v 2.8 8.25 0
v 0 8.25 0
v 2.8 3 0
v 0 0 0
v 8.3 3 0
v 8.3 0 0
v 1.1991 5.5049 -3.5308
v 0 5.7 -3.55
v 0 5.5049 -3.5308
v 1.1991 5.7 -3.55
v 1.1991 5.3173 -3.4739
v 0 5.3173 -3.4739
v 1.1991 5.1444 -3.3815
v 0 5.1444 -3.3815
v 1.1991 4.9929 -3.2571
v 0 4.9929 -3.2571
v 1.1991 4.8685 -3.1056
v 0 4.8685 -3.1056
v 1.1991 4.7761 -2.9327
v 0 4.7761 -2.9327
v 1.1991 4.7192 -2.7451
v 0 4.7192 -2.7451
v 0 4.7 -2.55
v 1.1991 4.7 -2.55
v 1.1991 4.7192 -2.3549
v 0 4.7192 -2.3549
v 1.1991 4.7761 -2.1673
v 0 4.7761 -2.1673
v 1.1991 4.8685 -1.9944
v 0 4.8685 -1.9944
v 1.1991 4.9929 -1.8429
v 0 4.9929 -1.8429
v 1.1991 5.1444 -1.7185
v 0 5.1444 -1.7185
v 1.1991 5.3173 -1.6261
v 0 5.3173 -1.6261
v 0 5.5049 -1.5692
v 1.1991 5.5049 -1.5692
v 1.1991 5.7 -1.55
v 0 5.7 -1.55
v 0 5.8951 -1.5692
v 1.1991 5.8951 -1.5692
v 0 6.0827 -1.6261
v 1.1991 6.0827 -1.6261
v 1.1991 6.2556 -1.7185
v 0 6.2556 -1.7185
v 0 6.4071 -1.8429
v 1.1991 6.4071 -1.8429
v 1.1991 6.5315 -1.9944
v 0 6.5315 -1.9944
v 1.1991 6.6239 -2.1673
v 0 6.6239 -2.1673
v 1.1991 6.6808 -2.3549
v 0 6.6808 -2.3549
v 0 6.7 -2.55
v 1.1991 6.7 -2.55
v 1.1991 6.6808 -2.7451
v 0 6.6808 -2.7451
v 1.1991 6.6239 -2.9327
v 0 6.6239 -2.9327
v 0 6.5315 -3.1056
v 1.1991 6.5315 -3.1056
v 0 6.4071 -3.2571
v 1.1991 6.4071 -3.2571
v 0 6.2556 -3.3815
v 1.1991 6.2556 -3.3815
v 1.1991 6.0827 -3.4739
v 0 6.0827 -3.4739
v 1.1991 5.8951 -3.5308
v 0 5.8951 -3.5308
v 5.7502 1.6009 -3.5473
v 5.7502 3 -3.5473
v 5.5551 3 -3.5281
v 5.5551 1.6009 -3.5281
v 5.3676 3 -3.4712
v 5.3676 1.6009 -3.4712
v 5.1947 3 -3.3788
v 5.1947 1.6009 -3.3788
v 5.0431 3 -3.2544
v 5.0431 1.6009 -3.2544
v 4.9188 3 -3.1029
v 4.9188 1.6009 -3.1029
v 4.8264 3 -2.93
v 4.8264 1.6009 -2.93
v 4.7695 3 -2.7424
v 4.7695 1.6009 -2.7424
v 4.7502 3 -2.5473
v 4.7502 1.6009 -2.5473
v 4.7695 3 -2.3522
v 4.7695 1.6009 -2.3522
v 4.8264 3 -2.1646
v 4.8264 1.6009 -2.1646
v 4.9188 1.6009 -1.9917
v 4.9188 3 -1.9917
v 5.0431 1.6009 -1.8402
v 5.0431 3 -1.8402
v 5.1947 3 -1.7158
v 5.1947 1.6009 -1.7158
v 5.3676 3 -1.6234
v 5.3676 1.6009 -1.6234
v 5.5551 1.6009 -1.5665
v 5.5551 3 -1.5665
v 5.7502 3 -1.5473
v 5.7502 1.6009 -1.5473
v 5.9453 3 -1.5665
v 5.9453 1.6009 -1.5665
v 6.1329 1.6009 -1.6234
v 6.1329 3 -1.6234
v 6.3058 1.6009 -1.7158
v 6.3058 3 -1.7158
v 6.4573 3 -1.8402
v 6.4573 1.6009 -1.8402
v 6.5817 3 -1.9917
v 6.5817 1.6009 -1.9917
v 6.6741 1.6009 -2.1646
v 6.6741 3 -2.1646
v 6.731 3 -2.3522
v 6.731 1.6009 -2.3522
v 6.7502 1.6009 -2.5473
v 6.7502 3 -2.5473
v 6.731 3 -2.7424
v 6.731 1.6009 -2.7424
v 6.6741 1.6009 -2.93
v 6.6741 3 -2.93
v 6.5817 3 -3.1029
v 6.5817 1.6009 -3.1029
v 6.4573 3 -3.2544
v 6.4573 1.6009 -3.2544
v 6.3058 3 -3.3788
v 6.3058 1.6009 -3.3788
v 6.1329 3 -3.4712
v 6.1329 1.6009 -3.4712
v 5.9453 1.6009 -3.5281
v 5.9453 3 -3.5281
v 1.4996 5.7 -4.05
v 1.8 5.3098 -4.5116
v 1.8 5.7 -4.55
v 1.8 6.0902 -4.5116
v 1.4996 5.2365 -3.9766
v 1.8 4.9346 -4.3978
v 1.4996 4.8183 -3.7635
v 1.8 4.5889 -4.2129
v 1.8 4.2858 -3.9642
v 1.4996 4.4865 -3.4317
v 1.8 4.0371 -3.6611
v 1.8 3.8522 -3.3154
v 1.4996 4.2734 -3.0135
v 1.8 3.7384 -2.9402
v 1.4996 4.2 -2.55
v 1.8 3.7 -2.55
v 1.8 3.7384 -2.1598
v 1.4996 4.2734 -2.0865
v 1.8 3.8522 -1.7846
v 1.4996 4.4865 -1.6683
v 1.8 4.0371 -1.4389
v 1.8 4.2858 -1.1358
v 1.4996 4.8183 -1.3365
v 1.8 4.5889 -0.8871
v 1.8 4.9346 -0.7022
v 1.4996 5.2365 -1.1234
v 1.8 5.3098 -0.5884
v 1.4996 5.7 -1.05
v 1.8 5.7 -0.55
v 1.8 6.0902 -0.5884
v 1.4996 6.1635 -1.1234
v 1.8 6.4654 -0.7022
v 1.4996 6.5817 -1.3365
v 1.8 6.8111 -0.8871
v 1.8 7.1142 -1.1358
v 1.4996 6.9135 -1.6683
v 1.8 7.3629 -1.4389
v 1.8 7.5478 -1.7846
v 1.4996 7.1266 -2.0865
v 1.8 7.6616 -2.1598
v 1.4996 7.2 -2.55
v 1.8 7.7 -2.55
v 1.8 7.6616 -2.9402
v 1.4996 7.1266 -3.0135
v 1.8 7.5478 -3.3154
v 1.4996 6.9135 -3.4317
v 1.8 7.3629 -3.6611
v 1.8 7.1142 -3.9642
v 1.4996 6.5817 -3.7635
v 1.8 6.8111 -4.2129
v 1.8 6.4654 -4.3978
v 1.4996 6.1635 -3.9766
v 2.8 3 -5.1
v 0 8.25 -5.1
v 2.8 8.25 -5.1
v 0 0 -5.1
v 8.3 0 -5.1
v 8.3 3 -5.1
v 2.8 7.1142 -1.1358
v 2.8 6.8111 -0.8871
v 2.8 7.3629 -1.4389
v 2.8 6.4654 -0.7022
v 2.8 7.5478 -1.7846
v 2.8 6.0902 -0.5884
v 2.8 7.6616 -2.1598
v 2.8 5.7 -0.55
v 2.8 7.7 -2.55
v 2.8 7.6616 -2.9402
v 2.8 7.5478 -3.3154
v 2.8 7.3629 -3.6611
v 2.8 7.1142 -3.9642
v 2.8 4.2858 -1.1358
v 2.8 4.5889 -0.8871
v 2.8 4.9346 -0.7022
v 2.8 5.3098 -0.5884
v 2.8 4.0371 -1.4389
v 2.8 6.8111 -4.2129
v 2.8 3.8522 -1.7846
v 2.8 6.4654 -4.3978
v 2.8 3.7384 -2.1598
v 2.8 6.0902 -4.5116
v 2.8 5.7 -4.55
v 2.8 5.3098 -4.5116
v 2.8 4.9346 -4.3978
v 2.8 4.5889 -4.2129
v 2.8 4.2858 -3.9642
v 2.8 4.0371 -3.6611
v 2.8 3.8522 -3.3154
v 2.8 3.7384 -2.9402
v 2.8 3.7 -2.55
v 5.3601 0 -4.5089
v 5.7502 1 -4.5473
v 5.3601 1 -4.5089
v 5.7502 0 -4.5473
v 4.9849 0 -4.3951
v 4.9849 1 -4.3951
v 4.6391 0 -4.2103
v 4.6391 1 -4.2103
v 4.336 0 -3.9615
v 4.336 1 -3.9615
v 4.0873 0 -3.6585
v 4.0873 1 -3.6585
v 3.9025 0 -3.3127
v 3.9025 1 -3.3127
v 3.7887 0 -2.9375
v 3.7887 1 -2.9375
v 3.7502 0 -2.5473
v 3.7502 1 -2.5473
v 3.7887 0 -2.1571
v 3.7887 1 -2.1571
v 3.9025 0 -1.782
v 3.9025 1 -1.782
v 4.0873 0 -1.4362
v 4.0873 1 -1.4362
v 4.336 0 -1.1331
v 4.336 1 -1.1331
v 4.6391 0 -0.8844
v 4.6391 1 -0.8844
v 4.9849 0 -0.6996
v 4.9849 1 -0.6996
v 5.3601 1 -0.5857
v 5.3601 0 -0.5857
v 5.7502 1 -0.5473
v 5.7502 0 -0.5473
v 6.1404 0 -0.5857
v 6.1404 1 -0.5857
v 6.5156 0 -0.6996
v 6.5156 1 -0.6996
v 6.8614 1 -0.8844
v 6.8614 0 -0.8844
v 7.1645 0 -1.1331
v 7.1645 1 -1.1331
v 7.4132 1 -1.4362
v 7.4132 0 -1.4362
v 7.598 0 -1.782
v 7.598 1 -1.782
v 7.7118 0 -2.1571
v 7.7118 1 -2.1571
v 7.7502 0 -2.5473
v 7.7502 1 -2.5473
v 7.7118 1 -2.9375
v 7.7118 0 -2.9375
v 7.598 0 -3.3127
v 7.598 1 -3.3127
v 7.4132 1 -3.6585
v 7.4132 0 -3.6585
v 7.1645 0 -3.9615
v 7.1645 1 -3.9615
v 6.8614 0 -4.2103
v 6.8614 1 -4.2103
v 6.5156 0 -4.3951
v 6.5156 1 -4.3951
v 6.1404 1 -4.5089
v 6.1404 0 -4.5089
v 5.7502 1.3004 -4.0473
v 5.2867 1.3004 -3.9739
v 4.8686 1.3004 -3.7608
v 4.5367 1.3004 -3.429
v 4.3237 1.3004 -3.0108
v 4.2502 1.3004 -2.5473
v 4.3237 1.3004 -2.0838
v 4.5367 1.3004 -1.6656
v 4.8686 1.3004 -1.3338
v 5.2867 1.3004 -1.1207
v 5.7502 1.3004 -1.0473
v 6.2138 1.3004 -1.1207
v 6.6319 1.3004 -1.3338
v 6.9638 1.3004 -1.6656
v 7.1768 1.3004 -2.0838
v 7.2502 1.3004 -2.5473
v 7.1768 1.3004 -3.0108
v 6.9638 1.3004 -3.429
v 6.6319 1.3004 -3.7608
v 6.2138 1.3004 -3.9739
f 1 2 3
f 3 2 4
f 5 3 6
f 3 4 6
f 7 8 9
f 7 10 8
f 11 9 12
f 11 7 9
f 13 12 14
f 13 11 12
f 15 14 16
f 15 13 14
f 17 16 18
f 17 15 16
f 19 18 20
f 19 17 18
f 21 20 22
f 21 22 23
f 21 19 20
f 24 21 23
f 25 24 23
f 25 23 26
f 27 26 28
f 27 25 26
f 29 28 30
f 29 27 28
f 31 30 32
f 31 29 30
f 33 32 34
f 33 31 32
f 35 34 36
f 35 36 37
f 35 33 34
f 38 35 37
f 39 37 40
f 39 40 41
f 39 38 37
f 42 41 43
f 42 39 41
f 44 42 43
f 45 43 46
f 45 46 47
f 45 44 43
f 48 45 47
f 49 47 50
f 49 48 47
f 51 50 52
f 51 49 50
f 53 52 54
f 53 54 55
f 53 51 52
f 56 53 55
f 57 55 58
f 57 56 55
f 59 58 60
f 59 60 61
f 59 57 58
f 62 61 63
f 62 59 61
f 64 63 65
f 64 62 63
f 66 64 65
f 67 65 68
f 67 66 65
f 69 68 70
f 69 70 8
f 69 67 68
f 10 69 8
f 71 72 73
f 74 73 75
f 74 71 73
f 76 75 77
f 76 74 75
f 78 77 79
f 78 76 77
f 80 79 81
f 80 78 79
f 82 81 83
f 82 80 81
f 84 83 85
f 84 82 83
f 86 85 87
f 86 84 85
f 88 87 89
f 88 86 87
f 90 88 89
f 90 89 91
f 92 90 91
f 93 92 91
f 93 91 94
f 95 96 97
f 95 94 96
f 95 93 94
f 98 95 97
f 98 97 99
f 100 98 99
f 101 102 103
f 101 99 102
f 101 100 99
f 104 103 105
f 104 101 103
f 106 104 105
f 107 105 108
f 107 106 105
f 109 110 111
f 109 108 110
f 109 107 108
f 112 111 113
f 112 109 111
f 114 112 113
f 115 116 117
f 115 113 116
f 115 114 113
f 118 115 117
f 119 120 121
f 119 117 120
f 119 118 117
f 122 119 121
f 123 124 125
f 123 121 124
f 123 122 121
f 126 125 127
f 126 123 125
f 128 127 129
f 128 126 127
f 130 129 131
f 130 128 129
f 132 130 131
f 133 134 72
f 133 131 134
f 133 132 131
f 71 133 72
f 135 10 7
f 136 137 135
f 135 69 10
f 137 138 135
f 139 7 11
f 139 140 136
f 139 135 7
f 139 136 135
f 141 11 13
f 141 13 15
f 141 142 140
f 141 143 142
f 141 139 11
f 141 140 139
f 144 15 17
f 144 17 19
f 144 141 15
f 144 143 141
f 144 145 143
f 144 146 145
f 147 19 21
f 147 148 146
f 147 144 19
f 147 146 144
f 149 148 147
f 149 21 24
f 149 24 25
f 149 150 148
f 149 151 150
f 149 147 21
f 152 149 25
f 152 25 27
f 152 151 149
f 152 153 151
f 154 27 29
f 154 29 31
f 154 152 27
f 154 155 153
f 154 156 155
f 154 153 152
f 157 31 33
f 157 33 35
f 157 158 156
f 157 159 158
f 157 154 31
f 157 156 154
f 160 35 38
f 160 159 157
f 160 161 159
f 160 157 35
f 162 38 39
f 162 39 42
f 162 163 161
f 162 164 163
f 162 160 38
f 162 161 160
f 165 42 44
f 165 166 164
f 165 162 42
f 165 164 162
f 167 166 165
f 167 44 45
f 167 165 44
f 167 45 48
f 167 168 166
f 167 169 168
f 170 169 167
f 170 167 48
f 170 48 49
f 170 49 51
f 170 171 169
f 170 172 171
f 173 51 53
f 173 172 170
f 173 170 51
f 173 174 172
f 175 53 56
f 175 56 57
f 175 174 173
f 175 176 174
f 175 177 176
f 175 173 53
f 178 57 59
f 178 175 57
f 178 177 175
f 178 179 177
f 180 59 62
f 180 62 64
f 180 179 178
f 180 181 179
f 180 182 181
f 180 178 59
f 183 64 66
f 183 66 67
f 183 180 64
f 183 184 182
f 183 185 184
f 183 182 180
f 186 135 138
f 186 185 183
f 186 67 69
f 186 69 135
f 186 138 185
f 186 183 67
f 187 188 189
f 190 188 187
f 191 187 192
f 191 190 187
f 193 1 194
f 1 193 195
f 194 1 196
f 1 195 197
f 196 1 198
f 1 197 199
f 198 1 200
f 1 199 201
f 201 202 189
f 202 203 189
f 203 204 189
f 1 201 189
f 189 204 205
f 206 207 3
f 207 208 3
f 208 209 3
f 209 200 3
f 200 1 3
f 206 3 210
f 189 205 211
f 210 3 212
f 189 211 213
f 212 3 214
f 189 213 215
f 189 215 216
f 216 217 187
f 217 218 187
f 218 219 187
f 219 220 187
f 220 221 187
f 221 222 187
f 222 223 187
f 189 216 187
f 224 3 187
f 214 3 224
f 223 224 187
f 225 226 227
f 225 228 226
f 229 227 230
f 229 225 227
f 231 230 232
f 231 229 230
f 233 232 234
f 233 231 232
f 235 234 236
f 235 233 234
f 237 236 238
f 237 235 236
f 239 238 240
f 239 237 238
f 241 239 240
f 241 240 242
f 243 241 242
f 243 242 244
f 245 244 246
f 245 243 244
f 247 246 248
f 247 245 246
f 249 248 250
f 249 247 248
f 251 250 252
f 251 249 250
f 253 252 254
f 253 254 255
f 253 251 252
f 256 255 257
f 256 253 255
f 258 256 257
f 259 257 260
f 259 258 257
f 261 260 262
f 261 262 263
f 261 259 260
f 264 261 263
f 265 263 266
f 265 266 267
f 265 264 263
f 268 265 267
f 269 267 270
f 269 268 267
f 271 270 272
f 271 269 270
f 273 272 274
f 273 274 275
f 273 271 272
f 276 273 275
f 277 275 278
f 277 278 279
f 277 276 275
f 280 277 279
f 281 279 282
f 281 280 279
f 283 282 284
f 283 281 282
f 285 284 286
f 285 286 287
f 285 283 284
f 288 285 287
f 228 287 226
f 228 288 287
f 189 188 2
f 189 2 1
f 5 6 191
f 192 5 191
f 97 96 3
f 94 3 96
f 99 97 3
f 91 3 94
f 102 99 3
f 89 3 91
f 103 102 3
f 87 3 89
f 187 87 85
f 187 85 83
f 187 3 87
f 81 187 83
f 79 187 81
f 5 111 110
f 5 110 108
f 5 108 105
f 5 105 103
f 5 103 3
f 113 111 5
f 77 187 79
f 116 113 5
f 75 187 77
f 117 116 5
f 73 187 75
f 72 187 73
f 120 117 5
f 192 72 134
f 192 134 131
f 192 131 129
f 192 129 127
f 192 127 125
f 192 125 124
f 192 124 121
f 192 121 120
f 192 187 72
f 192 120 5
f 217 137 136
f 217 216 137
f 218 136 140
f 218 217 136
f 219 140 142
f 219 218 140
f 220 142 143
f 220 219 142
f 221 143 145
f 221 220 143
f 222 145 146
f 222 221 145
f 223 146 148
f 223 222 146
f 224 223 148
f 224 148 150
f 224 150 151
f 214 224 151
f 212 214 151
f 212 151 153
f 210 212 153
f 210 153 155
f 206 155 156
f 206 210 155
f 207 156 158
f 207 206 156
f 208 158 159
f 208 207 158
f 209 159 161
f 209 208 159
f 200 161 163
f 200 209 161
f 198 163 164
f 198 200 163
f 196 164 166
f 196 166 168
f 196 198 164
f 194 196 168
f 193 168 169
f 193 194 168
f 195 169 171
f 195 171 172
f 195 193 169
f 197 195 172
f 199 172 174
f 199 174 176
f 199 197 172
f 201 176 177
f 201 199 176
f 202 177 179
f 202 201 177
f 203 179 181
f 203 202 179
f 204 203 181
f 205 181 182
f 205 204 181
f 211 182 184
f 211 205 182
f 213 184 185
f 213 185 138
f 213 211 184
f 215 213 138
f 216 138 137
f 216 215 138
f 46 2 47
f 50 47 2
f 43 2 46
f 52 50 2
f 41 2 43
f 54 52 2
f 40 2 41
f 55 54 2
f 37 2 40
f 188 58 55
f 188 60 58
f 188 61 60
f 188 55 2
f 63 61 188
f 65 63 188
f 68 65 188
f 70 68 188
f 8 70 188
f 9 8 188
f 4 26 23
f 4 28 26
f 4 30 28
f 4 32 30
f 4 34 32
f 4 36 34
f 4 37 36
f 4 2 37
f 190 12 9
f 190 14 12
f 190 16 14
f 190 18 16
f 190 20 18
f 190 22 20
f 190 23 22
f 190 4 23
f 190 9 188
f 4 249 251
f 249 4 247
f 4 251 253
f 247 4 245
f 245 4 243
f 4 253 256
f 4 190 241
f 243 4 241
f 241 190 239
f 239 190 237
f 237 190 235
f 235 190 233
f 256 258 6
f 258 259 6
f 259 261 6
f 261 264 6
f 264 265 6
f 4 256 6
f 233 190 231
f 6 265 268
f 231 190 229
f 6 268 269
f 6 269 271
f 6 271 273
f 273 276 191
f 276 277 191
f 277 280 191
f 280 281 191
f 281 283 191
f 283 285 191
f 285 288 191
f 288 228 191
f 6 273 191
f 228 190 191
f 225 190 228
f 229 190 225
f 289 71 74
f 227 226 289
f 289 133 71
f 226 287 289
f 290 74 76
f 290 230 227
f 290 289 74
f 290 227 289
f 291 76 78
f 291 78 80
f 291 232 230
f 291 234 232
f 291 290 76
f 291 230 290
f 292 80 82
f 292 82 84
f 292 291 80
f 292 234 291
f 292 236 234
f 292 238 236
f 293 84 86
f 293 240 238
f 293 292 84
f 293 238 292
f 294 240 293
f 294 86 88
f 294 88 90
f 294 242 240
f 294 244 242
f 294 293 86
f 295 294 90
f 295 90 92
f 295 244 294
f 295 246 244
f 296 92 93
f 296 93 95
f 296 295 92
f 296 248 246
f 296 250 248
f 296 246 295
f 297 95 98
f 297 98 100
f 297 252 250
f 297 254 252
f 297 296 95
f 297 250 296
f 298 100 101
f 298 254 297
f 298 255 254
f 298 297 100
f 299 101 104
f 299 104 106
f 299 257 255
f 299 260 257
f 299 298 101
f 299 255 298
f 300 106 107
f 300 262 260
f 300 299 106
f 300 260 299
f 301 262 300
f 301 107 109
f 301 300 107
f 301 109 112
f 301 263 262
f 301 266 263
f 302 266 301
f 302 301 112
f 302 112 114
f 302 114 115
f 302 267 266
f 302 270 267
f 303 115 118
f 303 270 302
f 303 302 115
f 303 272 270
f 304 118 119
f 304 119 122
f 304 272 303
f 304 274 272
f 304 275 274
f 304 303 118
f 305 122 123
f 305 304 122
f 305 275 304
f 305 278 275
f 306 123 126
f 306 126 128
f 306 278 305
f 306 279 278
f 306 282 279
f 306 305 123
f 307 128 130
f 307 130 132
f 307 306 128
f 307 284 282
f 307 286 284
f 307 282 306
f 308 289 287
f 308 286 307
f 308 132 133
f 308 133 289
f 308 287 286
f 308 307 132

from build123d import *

# Parameters (mm, degrees)
ESQUISSE1_W        = 8.3
ESQUISSE1_H        = 5.1
BOSS_EXTRU_1_DEPTH = 3
ESQUISSE2_W        = 2.8
ESQUISSE2_H        = 5.1
BOSS_EXTRU_2_DEPTH = 5.25


with BuildPart() as part:
    # Esquisse1 → Boss.-Extru.1 (new body)
    with BuildSketch(Plane(origin=(0, 0, 0), x_dir=(1, 0, 0), z_dir=(0, 1, 0))):
        with Locations((4.15, 2.55)):
            Rectangle(ESQUISSE1_W, ESQUISSE1_H)
    extrude(amount=BOSS_EXTRU_1_DEPTH)

    # Esquisse2 → Boss.-Extru.2 (add)
    with BuildSketch(Plane(origin=(0, 3, 0), x_dir=(1, 0, 0), z_dir=(0, 1, 0))):
        with Locations((1.4, 2.55)):
            Rectangle(ESQUISSE2_W, ESQUISSE2_H)
    extrude(amount=BOSS_EXTRU_2_DEPTH)

    # Esquisse6 → Perçage1 (revolve, cut)
    with BuildSketch(Plane(origin=(2.8, 5.7, -2.55), x_dir=(0, 0, -1), z_dir=(0, 1, 0))):
        Polygon((0, 0), (0, 3.400860619), (1, 2.8), (1, 1.600860619), (2, 1), (2, 0), align=None)
    revolve(axis=Axis((8.930023899, 5.7, -2.55), (-1, 0, 0)), mode=Mode.SUBTRACT)

    # Esquisse9 → Perçage2 (revolve, cut)
    with BuildSketch(Plane(origin=(5.750237397, 0, -2.547317036), x_dir=(0, 0, -1), z_dir=(1, 0, 0))):
        Polygon((0, 0), (0, 10.600860619), (1, 10), (1, 1.600860619), (2, 1), (2, 0), align=None)
    revolve(axis=Axis((5.750237397, -6.130023899, -2.547317036), (0, 1, 0)), mode=Mode.SUBTRACT)


solid = part.part
